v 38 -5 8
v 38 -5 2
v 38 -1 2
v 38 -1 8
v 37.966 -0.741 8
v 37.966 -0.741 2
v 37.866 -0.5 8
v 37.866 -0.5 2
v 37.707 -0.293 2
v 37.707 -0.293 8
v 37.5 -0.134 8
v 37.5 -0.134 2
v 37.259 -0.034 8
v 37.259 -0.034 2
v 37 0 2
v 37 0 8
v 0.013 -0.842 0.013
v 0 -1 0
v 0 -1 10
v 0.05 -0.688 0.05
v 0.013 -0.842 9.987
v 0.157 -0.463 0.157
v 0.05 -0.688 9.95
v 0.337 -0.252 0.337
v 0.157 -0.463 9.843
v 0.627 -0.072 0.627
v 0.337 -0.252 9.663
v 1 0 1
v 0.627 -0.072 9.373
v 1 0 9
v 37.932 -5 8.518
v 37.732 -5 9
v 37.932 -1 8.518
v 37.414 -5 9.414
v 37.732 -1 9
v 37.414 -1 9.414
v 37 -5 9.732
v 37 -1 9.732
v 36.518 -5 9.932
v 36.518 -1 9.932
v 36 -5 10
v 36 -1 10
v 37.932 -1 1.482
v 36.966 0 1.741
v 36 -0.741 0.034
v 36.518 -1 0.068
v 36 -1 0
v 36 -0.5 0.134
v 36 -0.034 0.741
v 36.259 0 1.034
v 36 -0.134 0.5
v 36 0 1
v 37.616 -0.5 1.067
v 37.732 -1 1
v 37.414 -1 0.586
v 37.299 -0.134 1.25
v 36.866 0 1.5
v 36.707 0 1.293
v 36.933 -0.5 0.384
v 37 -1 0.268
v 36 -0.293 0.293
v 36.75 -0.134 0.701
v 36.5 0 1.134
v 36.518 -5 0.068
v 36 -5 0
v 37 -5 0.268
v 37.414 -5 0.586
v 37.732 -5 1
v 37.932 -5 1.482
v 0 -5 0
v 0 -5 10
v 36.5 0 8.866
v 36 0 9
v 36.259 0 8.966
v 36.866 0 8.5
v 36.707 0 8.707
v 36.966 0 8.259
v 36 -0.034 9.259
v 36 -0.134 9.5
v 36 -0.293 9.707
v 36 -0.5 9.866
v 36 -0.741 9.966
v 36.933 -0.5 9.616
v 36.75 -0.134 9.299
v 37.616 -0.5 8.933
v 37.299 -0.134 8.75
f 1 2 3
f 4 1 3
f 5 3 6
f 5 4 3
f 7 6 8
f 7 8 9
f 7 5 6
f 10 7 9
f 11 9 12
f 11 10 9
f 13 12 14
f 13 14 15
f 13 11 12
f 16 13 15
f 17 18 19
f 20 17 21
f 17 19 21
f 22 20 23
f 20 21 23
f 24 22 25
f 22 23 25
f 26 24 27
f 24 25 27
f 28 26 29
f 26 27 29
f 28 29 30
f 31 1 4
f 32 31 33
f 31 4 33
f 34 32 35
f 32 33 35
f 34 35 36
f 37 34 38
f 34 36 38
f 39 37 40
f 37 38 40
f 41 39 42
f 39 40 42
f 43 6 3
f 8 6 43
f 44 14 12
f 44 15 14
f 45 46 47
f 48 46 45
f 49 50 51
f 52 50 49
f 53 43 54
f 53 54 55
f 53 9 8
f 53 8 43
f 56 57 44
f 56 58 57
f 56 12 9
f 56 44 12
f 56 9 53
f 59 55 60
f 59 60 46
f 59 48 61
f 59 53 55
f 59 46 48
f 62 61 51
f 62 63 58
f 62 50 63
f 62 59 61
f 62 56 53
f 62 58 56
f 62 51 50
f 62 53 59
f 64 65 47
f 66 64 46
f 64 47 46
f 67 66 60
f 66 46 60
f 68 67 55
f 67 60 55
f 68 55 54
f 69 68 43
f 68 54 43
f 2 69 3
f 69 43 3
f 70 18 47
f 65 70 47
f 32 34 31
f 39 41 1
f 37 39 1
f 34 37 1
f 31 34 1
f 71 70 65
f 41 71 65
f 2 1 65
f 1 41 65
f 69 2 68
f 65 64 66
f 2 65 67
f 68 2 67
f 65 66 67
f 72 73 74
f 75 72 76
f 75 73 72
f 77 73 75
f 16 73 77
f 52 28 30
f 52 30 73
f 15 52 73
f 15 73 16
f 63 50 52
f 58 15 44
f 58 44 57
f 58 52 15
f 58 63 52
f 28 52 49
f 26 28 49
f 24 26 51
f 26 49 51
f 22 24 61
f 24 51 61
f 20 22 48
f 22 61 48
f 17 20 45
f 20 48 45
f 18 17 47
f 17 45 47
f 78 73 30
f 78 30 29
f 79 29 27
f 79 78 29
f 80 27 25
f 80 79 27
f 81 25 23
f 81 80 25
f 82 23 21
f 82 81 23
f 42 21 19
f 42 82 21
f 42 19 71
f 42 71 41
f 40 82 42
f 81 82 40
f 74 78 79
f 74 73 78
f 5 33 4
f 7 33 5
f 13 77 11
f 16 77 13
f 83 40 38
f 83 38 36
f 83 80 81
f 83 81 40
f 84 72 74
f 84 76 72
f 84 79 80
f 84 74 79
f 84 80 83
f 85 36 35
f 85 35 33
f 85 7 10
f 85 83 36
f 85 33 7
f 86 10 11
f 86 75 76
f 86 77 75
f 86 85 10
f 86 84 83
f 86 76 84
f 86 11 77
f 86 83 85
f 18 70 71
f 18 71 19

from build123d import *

# Parameters (mm, degrees)
SCHIZZO1_W                   = 38
SCHIZZO1_H                   = 5
ESTRUSIONE_ESTRUSIONE1_DEPTH = 10
RACCORDO1_R                  = 1
RACCORDO2_R                  = 2


with BuildPart() as part:
    # Schizzo1 → Estrusione-Estrusione1 (new body)
    with BuildSketch(Plane.XY):
        with Locations((19, -2.5)):
            Rectangle(SCHIZZO1_W, SCHIZZO1_H)
    extrude(amount=ESTRUSIONE_ESTRUSIONE1_DEPTH)

    # Raccordo1
    raccordo1_edges = [part.edges().sort_by_distance(p)[0] for p in [
        (19, 0, 10),
        (19, 0, 0),
        (0, 0, 5),
        (38, 0, 5),
    ]]
    fillet(raccordo1_edges, radius=RACCORDO1_R)

    # Raccordo2
    # the kernel refuses this fillet: 2 mm, written as the material it takes off along each edge
    with BuildSketch(Plane(origin=(36, 0, 8), x_dir=(0, 0, 1), z_dir=(-1, 0, 0))) as raccordo2_piece_1:
        with BuildLine():
            CenterArc((1, -1), 1, 0, 90)
            Line((2, -1), (2, 0))
            Line((2, 0), (1, 0))
        make_face()
    revolve(axis=Axis((36, 0, 8), (0, 1, 0)), revolution_arc=90, mode=Mode.SUBTRACT)
    with BuildSketch(Plane(origin=(36, 0, 2), x_dir=(1, 0, 0), z_dir=(0, 0, 1))) as raccordo2_piece_2:
        with BuildLine():
            CenterArc((1, -1), 1, 0, 90)
            Line((2, -1), (2, 0))
            Line((2, 0), (1, 0))
        make_face()
    revolve(axis=Axis((36, 0, 2), (0, 1, 0)), revolution_arc=90, mode=Mode.SUBTRACT)
    with BuildSketch(Plane(origin=(38, 0, 10), x_dir=(-1, 0, 0), z_dir=(0, -1, 0)), Plane(origin=(38, 0, 0), x_dir=(0, 0, 1), z_dir=(0, -1, 0))) as raccordo2_piece_3:
        with BuildLine():
            CenterArc((RACCORDO2_R, RACCORDO2_R), RACCORDO2_R, 180, 90)
            Line((0, RACCORDO2_R), (0, 0))
            Line((0, 0), (RACCORDO2_R, 0))
        make_face()
    extrude(amount=10, mode=Mode.SUBTRACT)


solid = part.part
